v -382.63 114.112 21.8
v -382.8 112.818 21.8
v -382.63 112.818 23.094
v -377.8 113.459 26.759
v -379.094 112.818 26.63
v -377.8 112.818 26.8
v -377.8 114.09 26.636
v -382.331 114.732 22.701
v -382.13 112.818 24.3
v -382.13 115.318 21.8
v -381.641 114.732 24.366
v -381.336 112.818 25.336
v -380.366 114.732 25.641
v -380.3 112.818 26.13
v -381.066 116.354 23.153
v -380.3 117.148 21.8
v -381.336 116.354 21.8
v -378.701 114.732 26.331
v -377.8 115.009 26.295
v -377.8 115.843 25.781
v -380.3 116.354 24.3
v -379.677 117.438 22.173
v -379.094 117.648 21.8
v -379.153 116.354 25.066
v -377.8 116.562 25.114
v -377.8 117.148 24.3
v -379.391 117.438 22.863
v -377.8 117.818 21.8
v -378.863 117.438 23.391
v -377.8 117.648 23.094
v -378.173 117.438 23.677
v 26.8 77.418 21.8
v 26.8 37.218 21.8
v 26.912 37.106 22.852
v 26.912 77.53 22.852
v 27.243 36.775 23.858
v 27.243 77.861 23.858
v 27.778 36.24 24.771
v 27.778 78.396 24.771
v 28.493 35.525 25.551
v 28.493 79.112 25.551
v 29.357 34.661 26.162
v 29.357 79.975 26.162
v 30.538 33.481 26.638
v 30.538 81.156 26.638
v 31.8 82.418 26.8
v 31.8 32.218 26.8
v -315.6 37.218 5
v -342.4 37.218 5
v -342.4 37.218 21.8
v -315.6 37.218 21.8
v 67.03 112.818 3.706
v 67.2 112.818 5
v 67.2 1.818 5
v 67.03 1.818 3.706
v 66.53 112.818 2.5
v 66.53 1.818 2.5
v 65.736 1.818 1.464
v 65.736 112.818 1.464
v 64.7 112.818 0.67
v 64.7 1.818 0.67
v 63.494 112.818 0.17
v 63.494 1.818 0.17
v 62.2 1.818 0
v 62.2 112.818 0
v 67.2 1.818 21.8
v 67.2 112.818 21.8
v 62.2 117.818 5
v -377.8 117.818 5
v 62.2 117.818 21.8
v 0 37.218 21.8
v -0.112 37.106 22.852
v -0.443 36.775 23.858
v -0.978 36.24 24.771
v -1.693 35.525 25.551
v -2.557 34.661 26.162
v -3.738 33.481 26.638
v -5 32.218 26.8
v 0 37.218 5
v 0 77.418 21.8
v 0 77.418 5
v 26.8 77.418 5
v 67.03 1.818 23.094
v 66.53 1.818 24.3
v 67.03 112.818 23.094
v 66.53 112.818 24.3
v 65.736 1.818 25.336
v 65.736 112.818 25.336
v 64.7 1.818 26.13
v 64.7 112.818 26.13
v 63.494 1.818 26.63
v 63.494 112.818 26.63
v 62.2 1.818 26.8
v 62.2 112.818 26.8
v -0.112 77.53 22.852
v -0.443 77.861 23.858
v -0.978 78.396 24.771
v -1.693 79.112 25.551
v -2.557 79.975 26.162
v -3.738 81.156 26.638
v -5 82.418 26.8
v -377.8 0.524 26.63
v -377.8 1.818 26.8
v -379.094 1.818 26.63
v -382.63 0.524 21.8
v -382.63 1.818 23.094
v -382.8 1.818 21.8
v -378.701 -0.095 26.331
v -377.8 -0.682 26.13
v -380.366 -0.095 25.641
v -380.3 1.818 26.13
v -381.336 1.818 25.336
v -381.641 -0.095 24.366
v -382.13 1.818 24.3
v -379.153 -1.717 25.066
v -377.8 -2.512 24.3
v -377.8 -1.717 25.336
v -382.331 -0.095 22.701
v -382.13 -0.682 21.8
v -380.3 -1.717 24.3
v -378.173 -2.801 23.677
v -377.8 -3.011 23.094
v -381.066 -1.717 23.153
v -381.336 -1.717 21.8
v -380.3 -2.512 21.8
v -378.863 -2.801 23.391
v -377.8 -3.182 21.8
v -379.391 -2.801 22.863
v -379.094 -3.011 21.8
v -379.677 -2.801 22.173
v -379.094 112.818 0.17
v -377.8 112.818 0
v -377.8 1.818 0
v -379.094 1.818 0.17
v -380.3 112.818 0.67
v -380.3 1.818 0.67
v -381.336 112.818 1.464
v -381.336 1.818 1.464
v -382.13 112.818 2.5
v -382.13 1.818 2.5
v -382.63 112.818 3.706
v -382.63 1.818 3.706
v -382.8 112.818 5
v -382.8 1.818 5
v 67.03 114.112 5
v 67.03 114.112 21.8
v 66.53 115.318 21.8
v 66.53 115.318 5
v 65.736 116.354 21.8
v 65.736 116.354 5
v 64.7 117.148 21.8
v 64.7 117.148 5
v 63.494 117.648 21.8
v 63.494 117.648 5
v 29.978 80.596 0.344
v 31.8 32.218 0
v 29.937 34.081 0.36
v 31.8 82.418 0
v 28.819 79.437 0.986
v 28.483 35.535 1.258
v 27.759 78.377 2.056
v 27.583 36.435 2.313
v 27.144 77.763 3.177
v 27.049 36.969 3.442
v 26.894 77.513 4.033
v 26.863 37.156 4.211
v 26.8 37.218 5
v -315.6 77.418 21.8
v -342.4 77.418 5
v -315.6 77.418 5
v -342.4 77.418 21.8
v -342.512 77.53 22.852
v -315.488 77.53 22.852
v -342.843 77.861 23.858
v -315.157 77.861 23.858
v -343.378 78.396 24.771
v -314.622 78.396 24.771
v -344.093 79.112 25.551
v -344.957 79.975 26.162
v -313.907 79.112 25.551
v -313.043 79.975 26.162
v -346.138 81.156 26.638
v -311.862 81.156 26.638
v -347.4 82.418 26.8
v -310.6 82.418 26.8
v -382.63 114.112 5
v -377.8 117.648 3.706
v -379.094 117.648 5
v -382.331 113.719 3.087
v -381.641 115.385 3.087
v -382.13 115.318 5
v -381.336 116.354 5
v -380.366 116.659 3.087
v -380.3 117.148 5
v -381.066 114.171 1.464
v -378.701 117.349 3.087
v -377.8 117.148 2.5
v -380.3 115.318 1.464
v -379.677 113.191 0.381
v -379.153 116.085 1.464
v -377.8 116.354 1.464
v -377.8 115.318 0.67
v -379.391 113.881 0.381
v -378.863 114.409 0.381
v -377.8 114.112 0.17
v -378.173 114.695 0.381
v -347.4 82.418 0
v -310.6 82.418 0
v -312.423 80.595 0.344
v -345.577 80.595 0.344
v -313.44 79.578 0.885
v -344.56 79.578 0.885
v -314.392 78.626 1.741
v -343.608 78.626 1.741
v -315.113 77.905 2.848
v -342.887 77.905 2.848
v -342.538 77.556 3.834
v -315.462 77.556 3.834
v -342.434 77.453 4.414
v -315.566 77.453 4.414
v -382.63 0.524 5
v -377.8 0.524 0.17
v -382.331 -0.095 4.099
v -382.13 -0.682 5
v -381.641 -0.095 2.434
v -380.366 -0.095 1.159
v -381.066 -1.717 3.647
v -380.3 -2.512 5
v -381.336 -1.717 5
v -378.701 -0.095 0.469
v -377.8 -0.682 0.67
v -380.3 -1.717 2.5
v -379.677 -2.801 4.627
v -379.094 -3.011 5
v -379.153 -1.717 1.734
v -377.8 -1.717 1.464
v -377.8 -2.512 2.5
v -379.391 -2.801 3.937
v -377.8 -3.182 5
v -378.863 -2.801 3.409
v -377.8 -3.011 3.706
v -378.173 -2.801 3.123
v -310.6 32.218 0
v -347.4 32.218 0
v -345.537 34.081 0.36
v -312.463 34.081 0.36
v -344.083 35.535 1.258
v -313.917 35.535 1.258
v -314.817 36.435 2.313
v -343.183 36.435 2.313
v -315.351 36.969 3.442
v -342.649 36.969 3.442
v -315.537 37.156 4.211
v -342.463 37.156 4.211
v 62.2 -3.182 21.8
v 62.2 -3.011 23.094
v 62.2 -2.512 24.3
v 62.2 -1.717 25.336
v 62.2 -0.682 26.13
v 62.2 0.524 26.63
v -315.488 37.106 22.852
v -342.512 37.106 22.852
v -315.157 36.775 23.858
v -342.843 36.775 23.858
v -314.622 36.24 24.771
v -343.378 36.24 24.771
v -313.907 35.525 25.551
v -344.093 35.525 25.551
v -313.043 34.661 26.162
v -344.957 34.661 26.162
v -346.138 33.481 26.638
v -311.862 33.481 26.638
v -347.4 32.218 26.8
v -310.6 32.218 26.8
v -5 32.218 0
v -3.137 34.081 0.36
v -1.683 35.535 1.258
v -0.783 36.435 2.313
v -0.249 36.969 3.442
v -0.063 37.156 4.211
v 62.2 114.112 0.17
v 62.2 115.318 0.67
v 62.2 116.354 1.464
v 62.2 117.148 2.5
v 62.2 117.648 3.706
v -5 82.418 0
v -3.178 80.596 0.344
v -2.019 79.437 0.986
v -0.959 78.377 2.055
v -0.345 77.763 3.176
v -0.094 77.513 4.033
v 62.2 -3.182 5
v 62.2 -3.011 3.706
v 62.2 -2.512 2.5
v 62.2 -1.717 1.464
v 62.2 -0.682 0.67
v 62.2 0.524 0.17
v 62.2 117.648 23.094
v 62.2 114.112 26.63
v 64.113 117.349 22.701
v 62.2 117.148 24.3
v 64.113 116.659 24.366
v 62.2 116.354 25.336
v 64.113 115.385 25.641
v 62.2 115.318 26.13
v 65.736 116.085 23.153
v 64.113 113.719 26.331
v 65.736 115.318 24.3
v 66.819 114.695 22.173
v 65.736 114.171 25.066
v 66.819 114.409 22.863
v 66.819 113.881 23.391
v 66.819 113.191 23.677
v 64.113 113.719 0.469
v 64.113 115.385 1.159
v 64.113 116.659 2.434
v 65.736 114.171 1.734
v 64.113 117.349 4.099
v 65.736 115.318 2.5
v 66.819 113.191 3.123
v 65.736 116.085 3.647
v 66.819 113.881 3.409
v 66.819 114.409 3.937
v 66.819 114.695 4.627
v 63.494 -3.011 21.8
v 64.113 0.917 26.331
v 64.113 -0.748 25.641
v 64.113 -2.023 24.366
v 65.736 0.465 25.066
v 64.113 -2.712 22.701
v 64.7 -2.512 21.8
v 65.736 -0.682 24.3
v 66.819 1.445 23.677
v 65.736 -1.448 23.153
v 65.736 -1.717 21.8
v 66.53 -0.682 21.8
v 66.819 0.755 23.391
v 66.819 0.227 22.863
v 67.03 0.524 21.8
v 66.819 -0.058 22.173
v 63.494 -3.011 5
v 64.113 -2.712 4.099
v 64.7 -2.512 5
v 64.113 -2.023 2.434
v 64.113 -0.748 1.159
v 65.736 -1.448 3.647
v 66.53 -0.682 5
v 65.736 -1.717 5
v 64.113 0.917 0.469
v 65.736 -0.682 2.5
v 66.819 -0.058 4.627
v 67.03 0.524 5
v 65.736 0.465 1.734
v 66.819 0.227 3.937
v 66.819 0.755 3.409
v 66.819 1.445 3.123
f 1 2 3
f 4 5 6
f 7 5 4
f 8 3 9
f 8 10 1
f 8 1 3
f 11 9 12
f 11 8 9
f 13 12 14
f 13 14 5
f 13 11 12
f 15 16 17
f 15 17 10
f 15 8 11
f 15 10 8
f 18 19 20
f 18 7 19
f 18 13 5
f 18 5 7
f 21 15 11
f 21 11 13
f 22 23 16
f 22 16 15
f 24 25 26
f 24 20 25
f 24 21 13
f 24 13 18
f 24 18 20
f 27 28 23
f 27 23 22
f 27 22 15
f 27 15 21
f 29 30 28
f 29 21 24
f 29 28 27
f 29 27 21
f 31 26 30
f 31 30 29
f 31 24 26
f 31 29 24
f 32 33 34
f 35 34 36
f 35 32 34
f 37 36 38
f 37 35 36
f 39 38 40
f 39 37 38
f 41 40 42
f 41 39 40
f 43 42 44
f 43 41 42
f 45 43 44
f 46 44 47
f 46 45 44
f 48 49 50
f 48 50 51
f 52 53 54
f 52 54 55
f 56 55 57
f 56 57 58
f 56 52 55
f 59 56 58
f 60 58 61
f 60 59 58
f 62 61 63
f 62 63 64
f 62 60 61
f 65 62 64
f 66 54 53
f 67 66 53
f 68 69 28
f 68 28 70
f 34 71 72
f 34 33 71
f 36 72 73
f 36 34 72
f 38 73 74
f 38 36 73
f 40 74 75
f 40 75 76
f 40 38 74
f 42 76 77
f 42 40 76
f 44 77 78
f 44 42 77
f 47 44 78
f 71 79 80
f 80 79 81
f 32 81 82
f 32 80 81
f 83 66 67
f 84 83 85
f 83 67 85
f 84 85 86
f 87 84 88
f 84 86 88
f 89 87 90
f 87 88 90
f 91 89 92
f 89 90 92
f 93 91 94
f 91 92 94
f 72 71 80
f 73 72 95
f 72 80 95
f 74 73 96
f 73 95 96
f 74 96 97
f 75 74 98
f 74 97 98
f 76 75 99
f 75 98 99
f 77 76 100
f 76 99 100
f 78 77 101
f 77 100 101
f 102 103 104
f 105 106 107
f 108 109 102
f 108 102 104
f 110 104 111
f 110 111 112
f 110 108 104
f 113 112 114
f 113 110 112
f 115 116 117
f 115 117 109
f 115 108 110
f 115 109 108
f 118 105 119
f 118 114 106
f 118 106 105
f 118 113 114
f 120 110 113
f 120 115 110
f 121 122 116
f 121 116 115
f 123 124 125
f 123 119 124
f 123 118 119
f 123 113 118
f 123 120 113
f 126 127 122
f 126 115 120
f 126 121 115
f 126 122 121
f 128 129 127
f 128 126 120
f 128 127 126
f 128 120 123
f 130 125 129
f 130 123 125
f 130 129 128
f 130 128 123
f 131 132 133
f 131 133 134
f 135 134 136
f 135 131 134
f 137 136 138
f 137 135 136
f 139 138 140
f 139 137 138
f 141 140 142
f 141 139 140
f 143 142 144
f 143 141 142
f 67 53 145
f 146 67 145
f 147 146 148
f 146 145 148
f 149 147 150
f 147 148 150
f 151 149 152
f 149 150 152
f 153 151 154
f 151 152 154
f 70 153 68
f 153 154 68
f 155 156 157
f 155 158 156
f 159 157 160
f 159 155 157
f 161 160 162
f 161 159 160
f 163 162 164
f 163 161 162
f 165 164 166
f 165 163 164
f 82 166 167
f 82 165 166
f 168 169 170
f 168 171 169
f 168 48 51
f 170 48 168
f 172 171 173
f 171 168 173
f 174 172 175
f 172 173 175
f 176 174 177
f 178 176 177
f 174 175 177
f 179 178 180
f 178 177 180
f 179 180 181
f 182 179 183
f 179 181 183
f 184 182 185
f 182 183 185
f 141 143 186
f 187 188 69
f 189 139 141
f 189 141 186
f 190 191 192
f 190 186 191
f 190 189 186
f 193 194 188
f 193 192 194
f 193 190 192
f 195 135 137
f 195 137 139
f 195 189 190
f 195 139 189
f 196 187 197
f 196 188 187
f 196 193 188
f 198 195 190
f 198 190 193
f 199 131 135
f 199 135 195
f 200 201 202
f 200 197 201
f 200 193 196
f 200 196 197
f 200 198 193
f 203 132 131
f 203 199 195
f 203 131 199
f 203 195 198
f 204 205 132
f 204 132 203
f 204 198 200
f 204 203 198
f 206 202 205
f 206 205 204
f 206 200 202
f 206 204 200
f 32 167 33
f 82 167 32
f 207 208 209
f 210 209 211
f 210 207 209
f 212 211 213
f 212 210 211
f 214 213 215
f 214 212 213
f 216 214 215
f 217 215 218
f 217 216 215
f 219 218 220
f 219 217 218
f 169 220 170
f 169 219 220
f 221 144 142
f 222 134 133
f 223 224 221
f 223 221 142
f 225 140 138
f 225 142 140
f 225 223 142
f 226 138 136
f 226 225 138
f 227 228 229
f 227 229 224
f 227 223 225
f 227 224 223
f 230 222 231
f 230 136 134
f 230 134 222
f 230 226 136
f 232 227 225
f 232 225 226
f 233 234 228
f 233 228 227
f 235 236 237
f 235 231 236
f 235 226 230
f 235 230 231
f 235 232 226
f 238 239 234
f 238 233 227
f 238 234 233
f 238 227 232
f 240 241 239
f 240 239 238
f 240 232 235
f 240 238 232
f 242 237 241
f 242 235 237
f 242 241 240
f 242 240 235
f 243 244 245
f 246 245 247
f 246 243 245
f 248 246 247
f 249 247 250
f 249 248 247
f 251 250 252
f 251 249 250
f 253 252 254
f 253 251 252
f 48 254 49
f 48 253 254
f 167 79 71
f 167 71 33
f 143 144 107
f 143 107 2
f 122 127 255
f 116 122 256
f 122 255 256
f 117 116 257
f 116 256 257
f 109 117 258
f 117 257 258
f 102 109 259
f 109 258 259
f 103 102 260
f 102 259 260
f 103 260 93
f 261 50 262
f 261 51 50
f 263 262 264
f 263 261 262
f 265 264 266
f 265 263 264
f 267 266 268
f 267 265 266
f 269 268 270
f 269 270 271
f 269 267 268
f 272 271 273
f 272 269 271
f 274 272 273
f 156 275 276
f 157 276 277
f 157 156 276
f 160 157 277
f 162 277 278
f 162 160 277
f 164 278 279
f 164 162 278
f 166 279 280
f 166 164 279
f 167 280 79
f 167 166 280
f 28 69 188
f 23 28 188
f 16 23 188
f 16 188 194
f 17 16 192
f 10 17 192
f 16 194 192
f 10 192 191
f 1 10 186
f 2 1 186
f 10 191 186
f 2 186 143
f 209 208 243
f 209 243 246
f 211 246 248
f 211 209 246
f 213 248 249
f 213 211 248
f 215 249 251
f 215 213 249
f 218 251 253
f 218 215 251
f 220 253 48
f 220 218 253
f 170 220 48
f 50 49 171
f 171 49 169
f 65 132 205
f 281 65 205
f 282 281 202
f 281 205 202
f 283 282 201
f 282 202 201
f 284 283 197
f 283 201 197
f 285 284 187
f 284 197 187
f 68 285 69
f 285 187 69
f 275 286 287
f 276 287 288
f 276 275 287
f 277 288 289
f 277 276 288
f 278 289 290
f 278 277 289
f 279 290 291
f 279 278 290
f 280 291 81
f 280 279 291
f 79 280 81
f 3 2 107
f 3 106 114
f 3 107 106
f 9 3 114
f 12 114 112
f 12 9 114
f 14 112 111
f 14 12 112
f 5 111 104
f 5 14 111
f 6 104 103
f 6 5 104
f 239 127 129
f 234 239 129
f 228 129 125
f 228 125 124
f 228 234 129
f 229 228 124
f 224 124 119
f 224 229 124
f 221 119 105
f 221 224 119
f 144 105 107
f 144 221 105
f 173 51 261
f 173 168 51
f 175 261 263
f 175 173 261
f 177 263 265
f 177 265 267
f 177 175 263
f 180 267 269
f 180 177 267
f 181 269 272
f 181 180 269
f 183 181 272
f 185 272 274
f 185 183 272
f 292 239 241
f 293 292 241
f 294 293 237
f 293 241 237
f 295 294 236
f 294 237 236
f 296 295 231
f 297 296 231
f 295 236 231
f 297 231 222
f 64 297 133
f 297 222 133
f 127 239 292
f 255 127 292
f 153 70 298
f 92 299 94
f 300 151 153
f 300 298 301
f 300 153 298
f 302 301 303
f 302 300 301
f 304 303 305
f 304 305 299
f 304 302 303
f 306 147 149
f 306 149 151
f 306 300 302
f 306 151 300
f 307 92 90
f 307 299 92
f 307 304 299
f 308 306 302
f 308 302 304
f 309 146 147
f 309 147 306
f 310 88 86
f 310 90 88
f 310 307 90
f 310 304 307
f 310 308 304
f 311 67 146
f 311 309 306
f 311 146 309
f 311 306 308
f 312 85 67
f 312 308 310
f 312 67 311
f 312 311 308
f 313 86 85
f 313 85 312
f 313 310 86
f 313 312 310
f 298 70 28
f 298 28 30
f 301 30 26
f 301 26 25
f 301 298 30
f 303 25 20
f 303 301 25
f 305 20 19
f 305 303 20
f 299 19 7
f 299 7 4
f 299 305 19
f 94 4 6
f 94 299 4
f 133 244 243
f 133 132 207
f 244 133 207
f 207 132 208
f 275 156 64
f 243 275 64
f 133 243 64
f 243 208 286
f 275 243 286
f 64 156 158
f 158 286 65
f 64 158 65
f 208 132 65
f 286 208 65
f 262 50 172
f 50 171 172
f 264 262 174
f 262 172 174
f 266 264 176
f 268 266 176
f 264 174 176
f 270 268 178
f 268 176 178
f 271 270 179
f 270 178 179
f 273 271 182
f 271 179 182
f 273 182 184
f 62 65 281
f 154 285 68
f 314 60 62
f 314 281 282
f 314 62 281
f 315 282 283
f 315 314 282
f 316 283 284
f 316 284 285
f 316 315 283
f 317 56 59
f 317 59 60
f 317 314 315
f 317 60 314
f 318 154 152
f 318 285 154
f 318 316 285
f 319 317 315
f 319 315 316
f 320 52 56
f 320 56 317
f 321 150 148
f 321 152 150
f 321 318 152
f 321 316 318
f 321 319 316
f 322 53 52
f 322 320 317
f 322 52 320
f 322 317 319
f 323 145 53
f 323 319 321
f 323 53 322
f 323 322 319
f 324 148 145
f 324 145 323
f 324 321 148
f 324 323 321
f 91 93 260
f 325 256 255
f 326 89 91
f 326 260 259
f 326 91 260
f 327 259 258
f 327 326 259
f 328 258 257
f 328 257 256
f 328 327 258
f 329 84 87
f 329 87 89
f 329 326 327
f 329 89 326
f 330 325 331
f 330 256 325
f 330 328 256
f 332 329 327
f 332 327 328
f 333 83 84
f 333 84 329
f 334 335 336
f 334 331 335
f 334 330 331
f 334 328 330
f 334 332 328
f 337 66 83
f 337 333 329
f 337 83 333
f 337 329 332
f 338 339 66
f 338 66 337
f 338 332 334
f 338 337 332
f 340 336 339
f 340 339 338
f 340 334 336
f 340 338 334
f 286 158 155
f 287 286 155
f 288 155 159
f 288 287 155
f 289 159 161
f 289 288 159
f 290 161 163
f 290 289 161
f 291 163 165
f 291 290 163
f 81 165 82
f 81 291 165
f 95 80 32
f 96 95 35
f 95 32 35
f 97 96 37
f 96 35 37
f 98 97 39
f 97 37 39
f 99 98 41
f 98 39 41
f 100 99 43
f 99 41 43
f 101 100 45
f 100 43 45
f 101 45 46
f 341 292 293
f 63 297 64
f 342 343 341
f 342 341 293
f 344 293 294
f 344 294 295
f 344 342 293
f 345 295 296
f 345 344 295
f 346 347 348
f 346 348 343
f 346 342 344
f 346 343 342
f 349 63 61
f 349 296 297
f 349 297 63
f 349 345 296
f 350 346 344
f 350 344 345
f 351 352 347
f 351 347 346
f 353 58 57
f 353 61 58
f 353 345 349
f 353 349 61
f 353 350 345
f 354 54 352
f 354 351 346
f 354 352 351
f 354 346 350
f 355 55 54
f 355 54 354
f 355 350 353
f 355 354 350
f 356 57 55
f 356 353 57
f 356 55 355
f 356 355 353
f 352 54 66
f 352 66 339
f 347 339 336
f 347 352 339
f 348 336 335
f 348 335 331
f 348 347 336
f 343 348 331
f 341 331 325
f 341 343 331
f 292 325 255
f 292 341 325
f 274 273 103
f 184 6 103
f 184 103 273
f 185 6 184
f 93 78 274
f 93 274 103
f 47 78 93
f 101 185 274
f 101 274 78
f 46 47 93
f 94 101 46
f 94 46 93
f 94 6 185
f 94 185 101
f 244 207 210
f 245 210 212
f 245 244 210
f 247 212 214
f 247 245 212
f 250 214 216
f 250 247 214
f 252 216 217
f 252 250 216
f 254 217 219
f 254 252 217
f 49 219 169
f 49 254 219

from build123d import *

# Parameters (mm, degrees)
F0_W          = 450
F0_H          = 121
F0_W_2        = 26.8
F0_H_2        = 40.2
F1_DEPTH      = 26.8
F2_R          = 5
F3_T1_DEPTH   = 440
F3_T3_DEPTH   = 111
F3_T5_DEPTH   = 40.2
F3_T7_DEPTH   = 26.8
F3_T9_DEPTH   = 26.8
F3_T11_DEPTH  = 16.8
F3_S15_W      = 5
F3_S15_H      = 5
F3_T16_DEPTH  = 5
F3_S21_W      = 5
F3_S21_H      = 5
F3_T22_DEPTH  = 5
F3_S27_W      = 5
F3_S27_H      = 5
F3_T28_DEPTH  = 5
F3_S33_W      = 5
F3_S33_H      = 5
F3_T34_DEPTH  = 5
F3_S39_W      = 5
F3_S39_H      = 5
F3_T40_DEPTH  = 5
F3_S45_W      = 5
F3_S45_H      = 5
F3_T46_DEPTH  = 5
F3_S51_W      = 5
F3_S51_H      = 5
F3_T52_DEPTH  = 5
F3_S57_W      = 5
F3_S57_H      = 5
F3_T58_DEPTH  = 5
F3_T65_DEPTH  = 39.3
F3_T69_DEPTH  = 52.7
F3_T76_DEPTH  = 39.3
F3_T80_DEPTH  = 52.7
F3_T87_DEPTH  = 39.3
F3_T91_DEPTH  = 52.7
F3_T98_DEPTH  = 52.7
F3_T102_DEPTH = 39.3
F3_T109_DEPTH = 52.7
F3_T113_DEPTH = 39.3
F3_T120_DEPTH = 52.7
F3_T124_DEPTH = 39.3
F3_T131_DEPTH = 52.7
F3_T135_DEPTH = 39.3
F3_T142_DEPTH = 39.3
F3_T146_DEPTH = 52.7


# Not quite as in the source:
# - a fillet or chamfer that OpenCascade refuses, or shapes differently, is made with other operations: its cross-section is extruded or revolved along the edge and cut away or added


with BuildPart() as f1:
    # F0 (on Top) → F1 (new body)
    with BuildSketch(Plane.XY):
        with Locations((-157.8, 57.318181593)):
            Rectangle(F0_W, F0_H)
        with Locations((-329, 57.318181593)):
            Rectangle(F0_W_2, F0_H_2, mode=Mode.SUBTRACT)
        with Locations((13.4, 57.318181593)):
            Rectangle(F0_W_2, F0_H_2, mode=Mode.SUBTRACT)
    extrude(amount=F1_DEPTH)

    # F2
    f2_edges = [f1.edges().sort_by_distance(p)[0] for p in [
        (67.2, 57.318182, 26.8),
        (-157.8, 117.818182, 26.8),
        (-382.8, 57.318182, 26.8),
        (-157.8, -3.181818, 26.8),
        (-342.4, 57.318182, 26.8),
        (-329, 77.418182, 26.8),
        (-315.6, 57.318182, 26.8),
        (-329, 37.218182, 26.8),
        (13.4, 77.418182, 26.8),
        (26.8, 57.318182, 26.8),
        (13.4, 37.218182, 26.8),
        (0, 57.318182, 26.8),
    ]]
    fillet(f2_edges, radius=F2_R)

    # F3: fillet of radius 5 on 16 edges, made by hand

    # F3_s2 → F3_t1 (cut)
    with BuildSketch(Plane.YZ.offset(-377.8)):
        with BuildLine():
            ThreePointArc((-3.181818407, 5), (-1.717352313, 1.4644660941), (1.818181593, 0))
            Line((1.818181593, 0), (-3.181818407, 0))
            Line((-3.181818407, 0), (-3.181818407, 5))
        make_face()
        with BuildLine():
            ThreePointArc((112.818181593, 0), (116.3537154989, 1.4644660941), (117.818181593, 5))
            Line((117.818181593, 5), (117.818181593, 0))
            Line((117.818181593, 0), (112.818181593, 0))
        make_face()
    extrude(amount=F3_T1_DEPTH, mode=Mode.SUBTRACT)

    # F3_s4 → F3_t3 (cut)
    with BuildSketch(Plane.XZ.offset(-112.818181593)):
        with BuildLine():
            ThreePointArc((-377.8, 0), (-381.3355339059, 1.4644660941), (-382.8, 5))
            Line((-382.8, 5), (-382.8, 0))
            Line((-382.8, 0), (-377.8, 0))
        make_face()
        with BuildLine():
            ThreePointArc((67.2, 5), (65.7355339059, 1.4644660941), (62.2, 0))
            Line((62.2, 0), (67.2, 0))
            Line((67.2, 0), (67.2, 5))
        make_face()
    extrude(amount=F3_T3_DEPTH, mode=Mode.SUBTRACT)

    # F3_s6 → F3_t5 (cut)
    with BuildSketch(Plane.XZ.offset(-77.418181593)):
        with BuildLine():
            ThreePointArc((-5, 0), (-1.4644660941, 1.4644660941), (0, 5))
            Line((0, 5), (0, 0))
            Line((0, 0), (-5, 0))
        make_face()
        with BuildLine():
            ThreePointArc((31.8, 0), (28.2644660941, 1.4644660941), (26.8, 5))
            Line((26.8, 5), (26.8, 0))
            Line((26.8, 0), (31.8, 0))
        make_face()
        with BuildLine():
            ThreePointArc((-347.4, 0), (-343.8644660941, 1.4644660941), (-342.4, 5))
            Line((-342.4, 5), (-342.4, 0))
            Line((-342.4, 0), (-347.4, 0))
        make_face()
        with BuildLine():
            ThreePointArc((-310.6, 0), (-314.1355339059, 1.4644660941), (-315.6, 5))
            Line((-315.6, 5), (-315.6, 0))
            Line((-315.6, 0), (-310.6, 0))
        make_face()
    extrude(amount=F3_T5_DEPTH, mode=Mode.SUBTRACT)

    # F3_s8 → F3_t7 (cut)
    with BuildSketch(Plane.YZ):
        with BuildLine():
            ThreePointArc((82.418181593, 0), (78.882647687, 1.4644660941), (77.418181593, 5))
            Line((77.418181593, 5), (77.418181593, 0))
            Line((77.418181593, 0), (82.418181593, 0))
        make_face()
        with BuildLine():
            ThreePointArc((32.218181593, 0), (35.7537154989, 1.4644660941), (37.218181593, 5))
            Line((37.218181593, 5), (37.218181593, 0))
            Line((37.218181593, 0), (32.218181593, 0))
        make_face()
    extrude(amount=F3_T7_DEPTH, mode=Mode.SUBTRACT)

    # F3_s10 → F3_t9 (cut)
    with BuildSketch(Plane.YZ.offset(-342.4)):
        with BuildLine():
            ThreePointArc((32.218181593, 0), (35.7537154989, 1.4644660941), (37.218181593, 5))
            Line((37.218181593, 5), (37.218181593, 0))
            Line((37.218181593, 0), (32.218181593, 0))
        make_face()
        with BuildLine():
            ThreePointArc((82.418181593, 0), (78.882647687, 1.4644660941), (77.418181593, 5))
            Line((77.418181593, 5), (77.418181593, 0))
            Line((77.418181593, 0), (82.418181593, 0))
        make_face()
    extrude(amount=F3_T9_DEPTH, mode=Mode.SUBTRACT)

    # F3_s12 → F3_t11 (cut)
    with BuildSketch(Plane.XY.offset(5)):
        with BuildLine():
            ThreePointArc((-377.8, -3.181818407), (-381.3355339059, -1.717352313), (-382.8, 1.818181593))
            Line((-382.8, 1.818181593), (-382.8, -3.181818407))
            Line((-382.8, -3.181818407), (-377.8, -3.181818407))
        make_face()
        with BuildLine():
            ThreePointArc((67.2, 1.818181593), (65.7355339059, -1.717352313), (62.2, -3.181818407))
            Line((62.2, -3.181818407), (67.2, -3.181818407))
            Line((67.2, -3.181818407), (67.2, 1.818181593))
        make_face()
        with BuildLine():
            ThreePointArc((-377.8, 117.818181593), (-381.3355339059, 116.3537154989), (-382.8, 112.818181593))
            Line((-382.8, 112.818181593), (-382.8, 117.818181593))
            Line((-382.8, 117.818181593), (-377.8, 117.818181593))
        make_face()
        with BuildLine():
            ThreePointArc((67.2, 112.818181593), (65.7355339059, 116.3537154989), (62.2, 117.818181593))
            Line((62.2, 117.818181593), (67.2, 117.818181593))
            Line((67.2, 117.818181593), (67.2, 112.818181593))
        make_face()
    extrude(amount=F3_T11_DEPTH, mode=Mode.SUBTRACT)


with BuildPart() as f3_tool14:
    # F3_s15 → F3_t16 (new body)
    with BuildSketch(Plane.YZ.offset(62.2)):
        with Locations((115.318181593, 24.3)):
            Rectangle(F3_S15_W, F3_S15_H)
    extrude(amount=F3_T16_DEPTH)

    # F3_s17 → F3_t18 (revolve, cut)
    with BuildSketch(Plane(origin=(62.2, 112.818181593, 21.8), x_dir=(0, -0.7071067812, -0.7071067812), z_dir=(0, -0.7071067812, 0.7071067812))):
        with BuildLine():
            ThreePointArc((0, -5), (5, 0), (0, 5))
            Line((0, 5), (0, -5))
        make_face()
    revolve(axis=Axis((62.2, 112.818181593, 21.8), (1, 0, 0)), mode=Mode.SUBTRACT)


with BuildPart() as f1_1:
    add(f1.part)

    # F3_t13: cut F3_tool14
    add(f3_tool14.part, mode=Mode.SUBTRACT)


with BuildPart() as f3_tool20:
    # F3_s21 → F3_t22 (new body)
    with BuildSketch(Plane.XZ.offset(-112.818181593)):
        with Locations((-380.3, 24.3)):
            Rectangle(F3_S21_W, F3_S21_H)
    extrude(amount=-F3_T22_DEPTH)

    # F3_s23 → F3_t24 (revolve, cut)
    with BuildSketch(Plane(origin=(-377.8, 112.818181593, 21.8), x_dir=(0.7071067812, 0, -0.7071067812), z_dir=(0.7071067812, 0, 0.7071067812))):
        with BuildLine():
            ThreePointArc((0, -5), (5, 0), (0, 5))
            Line((0, 5), (0, -5))
        make_face()
    revolve(axis=Axis((-377.8, 112.818181593, 21.8), (0, 1, 0)), mode=Mode.SUBTRACT)


with BuildPart() as f1_2:
    add(f1_1.part)

    # F3_t19: cut F3_tool20
    add(f3_tool20.part, mode=Mode.SUBTRACT)


with BuildPart() as f3_tool26:
    # F3_s27 → F3_t28 (new body)
    with BuildSketch(Plane.YZ.offset(62.2)):
        with Locations((-0.681818407, 24.3)):
            Rectangle(F3_S27_W, F3_S27_H)
    extrude(amount=F3_T28_DEPTH)

    # F3_s29 → F3_t30 (revolve, cut)
    with BuildSketch(Plane(origin=(62.2, 1.818181593, 21.8), x_dir=(0, 0.7071067812, -0.7071067812), z_dir=(0, -0.7071067812, -0.7071067812))):
        with BuildLine():
            ThreePointArc((0, -5), (5, 0), (0, 5))
            Line((0, 5), (0, -5))
        make_face()
    revolve(axis=Axis((62.2, 1.818181593, 21.8), (1, 0, 0)), mode=Mode.SUBTRACT)


with BuildPart() as f1_3:
    add(f1_2.part)

    # F3_t25: cut F3_tool26
    add(f3_tool26.part, mode=Mode.SUBTRACT)


with BuildPart() as f3_tool32:
    # F3_s33 → F3_t34 (new body)
    with BuildSketch(Plane.XZ.offset(-1.818181593)):
        with Locations((-380.3, 24.3)):
            Rectangle(F3_S33_W, F3_S33_H)
    extrude(amount=F3_T34_DEPTH)

    # F3_s35 → F3_t36 (revolve, cut)
    with BuildSketch(Plane(origin=(-377.8, 1.818181593, 21.8), x_dir=(0.7071067812, 0, -0.7071067812), z_dir=(-0.7071067812, 0, -0.7071067812))):
        with BuildLine():
            ThreePointArc((0, -5), (5, 0), (0, 5))
            Line((0, 5), (0, -5))
        make_face()
    revolve(axis=Axis((-377.8, 1.818181593, 21.8), (0, -1, 0)), mode=Mode.SUBTRACT)


with BuildPart() as f1_4:
    add(f1_3.part)

    # F3_t31: cut F3_tool32
    add(f3_tool32.part, mode=Mode.SUBTRACT)


with BuildPart() as f3_tool38:
    # F3_s39 → F3_t40 (new body)
    with BuildSketch(Plane.XZ.offset(-1.818181593)):
        with Locations((-380.3, 2.5)):
            Rectangle(F3_S39_W, F3_S39_H)
    extrude(amount=F3_T40_DEPTH)

    # F3_s41 → F3_t42 (revolve, cut)
    with BuildSketch(Plane(origin=(-377.8, 1.818181593, 5), x_dir=(0.7071067812, 0, 0.7071067812), z_dir=(0.7071067812, 0, -0.7071067812))):
        with BuildLine():
            ThreePointArc((0, -5), (5, 0), (0, 5))
            Line((0, 5), (0, -5))
        make_face()
    revolve(axis=Axis((-377.8, 1.818181593, 5), (0, -1, 0)), mode=Mode.SUBTRACT)


with BuildPart() as f1_5:
    add(f1_4.part)

    # F3_t37: cut F3_tool38
    add(f3_tool38.part, mode=Mode.SUBTRACT)


with BuildPart() as f3_tool44:
    # F3_s45 → F3_t46 (new body)
    with BuildSketch(Plane.YZ.offset(62.2)):
        with Locations((-0.681818407, 2.5)):
            Rectangle(F3_S45_W, F3_S45_H)
    extrude(amount=F3_T46_DEPTH)

    # F3_s47 → F3_t48 (revolve, cut)
    with BuildSketch(Plane(origin=(62.2, 1.818181593, 5), x_dir=(0, 0.7071067812, 0.7071067812), z_dir=(0, 0.7071067812, -0.7071067812))):
        with BuildLine():
            ThreePointArc((0, -5), (5, 0), (0, 5))
            Line((0, 5), (0, -5))
        make_face()
    revolve(axis=Axis((62.2, 1.818181593, 5), (1, 0, 0)), mode=Mode.SUBTRACT)


with BuildPart() as f1_6:
    add(f1_5.part)

    # F3_t43: cut F3_tool44
    add(f3_tool44.part, mode=Mode.SUBTRACT)


with BuildPart() as f3_tool50:
    # F3_s51 → F3_t52 (new body)
    with BuildSketch(Plane.XY.offset(5)):
        with Locations((-380.3, 115.318181593)):
            Rectangle(F3_S51_W, F3_S51_H)
    extrude(amount=-F3_T52_DEPTH)

    # F3_s53 → F3_t54 (revolve, cut)
    with BuildSketch(Plane(origin=(-377.8, 112.818181593, 5), x_dir=(0.7071067812, -0.7071067812, 0), z_dir=(0.7071067812, 0.7071067812, 0))):
        with BuildLine():
            ThreePointArc((0, -5), (5, 0), (0, 5))
            Line((0, 5), (0, -5))
        make_face()
    revolve(axis=Axis((-377.8, 112.818181593, 5), (0, 0, -1)), mode=Mode.SUBTRACT)


with BuildPart() as f1_7:
    add(f1_6.part)

    # F3_t49: cut F3_tool50
    add(f3_tool50.part, mode=Mode.SUBTRACT)


with BuildPart() as f3_tool56:
    # F3_s57 → F3_t58 (new body)
    with BuildSketch(Plane.YZ.offset(62.2)):
        with Locations((115.318181593, 2.5)):
            Rectangle(F3_S57_W, F3_S57_H)
    extrude(amount=F3_T58_DEPTH)

    # F3_s59 → F3_t60 (revolve, cut)
    with BuildSketch(Plane(origin=(62.2, 112.818181593, 5), x_dir=(0, -0.7071067812, 0.7071067812), z_dir=(0, 0.7071067812, 0.7071067812))):
        with BuildLine():
            ThreePointArc((0, -5), (5, 0), (0, 5))
            Line((0, 5), (0, -5))
        make_face()
    revolve(axis=Axis((62.2, 112.818181593, 5), (1, 0, 0)), mode=Mode.SUBTRACT)


with BuildPart() as f1_8:
    add(f1_7.part)

    # F3_t55: cut F3_tool56
    add(f3_tool56.part, mode=Mode.SUBTRACT)


with BuildPart() as f3_tool63:
    # F3_s64 → F3_t65 (new body)
    with BuildSketch(Plane.YZ.offset(26.8)):
        with BuildLine():
            ThreePointArc((32.218181593, 0), (35.7537154989, 1.4644660941), (37.218181593, 5))
            Line((37.218181593, 5), (37.218181593, 0))
            Line((37.218181593, 0), (32.218181593, 0))
        make_face()
    extrude(amount=-F3_T65_DEPTH)

    split(bisect_by=Plane.YZ, keep=Keep.BOTTOM)


with BuildPart() as f3_tool67:
    # F3_s68 → F3_t69 (new body)
    with BuildSketch(Plane.XZ.offset(-24.718181593)):
        with BuildLine():
            ThreePointArc((-5, 0), (-1.4644660941, 1.4644660941), (0, 5))
            Line((0, 5), (0, 0))
            Line((0, 0), (-5, 0))
        make_face()
    extrude(amount=-F3_T69_DEPTH)

    split(bisect_by=Plane.XZ.offset(-37.218181593), keep=Keep.TOP)


with BuildPart() as f3_tool63_1:
    add(f3_tool63.part)

    # F3_t71: intersect F3_tool67
    add(f3_tool67.part, mode=Mode.INTERSECT)


with BuildPart() as f1_9:
    add(f1_8.part)

    # F3_t61: cut F3_tool63
    add(f3_tool63_1.part, mode=Mode.SUBTRACT)


with BuildPart() as f3_tool74:
    # F3_s75 → F3_t76 (new body)
    with BuildSketch(Plane.YZ.offset(-12.5)):
        with BuildLine():
            ThreePointArc((82.418181593, 0), (78.882647687, 1.4644660941), (77.418181593, 5))
            Line((77.418181593, 5), (77.418181593, 0))
            Line((77.418181593, 0), (82.418181593, 0))
        make_face()
    extrude(amount=F3_T76_DEPTH)

    split(bisect_by=Plane.YZ, keep=Keep.BOTTOM)


with BuildPart() as f3_tool78:
    # F3_s79 → F3_t80 (new body)
    with BuildSketch(Plane.XZ.offset(-37.218181593)):
        with BuildLine():
            ThreePointArc((-5, 0), (-1.4644660941, 1.4644660941), (0, 5))
            Line((0, 5), (0, 0))
            Line((0, 0), (-5, 0))
        make_face()
    extrude(amount=-F3_T80_DEPTH)

    split(bisect_by=Plane.XZ.offset(-77.418181593), keep=Keep.BOTTOM)


with BuildPart() as f3_tool74_1:
    add(f3_tool74.part)

    # F3_t82: intersect F3_tool78
    add(f3_tool78.part, mode=Mode.INTERSECT)


with BuildPart() as f1_10:
    add(f1_9.part)

    # F3_t72: cut F3_tool74
    add(f3_tool74_1.part, mode=Mode.SUBTRACT)


with BuildPart() as f3_tool85:
    # F3_s86 → F3_t87 (new body)
    with BuildSketch(Plane.YZ):
        with BuildLine():
            ThreePointArc((82.418181593, 0), (78.882647687, 1.4644660941), (77.418181593, 5))
            Line((77.418181593, 5), (77.418181593, 0))
            Line((77.418181593, 0), (82.418181593, 0))
        make_face()
    extrude(amount=F3_T87_DEPTH)

    split(bisect_by=Plane.YZ.offset(26.8), keep=Keep.TOP)


with BuildPart() as f3_tool89:
    # F3_s90 → F3_t91 (new body)
    with BuildSketch(Plane.XZ.offset(-89.918181593)):
        with BuildLine():
            ThreePointArc((31.8, 0), (28.2644660941, 1.4644660941), (26.8, 5))
            Line((26.8, 5), (26.8, 0))
            Line((26.8, 0), (31.8, 0))
        make_face()
    extrude(amount=F3_T91_DEPTH)

    split(bisect_by=Plane.XZ.offset(-77.418181593), keep=Keep.BOTTOM)


with BuildPart() as f3_tool85_1:
    add(f3_tool85.part)

    # F3_t93: intersect F3_tool89
    add(f3_tool89.part, mode=Mode.INTERSECT)


with BuildPart() as f1_11:
    add(f1_10.part)

    # F3_t83: cut F3_tool85
    add(f3_tool85_1.part, mode=Mode.SUBTRACT)


with BuildPart() as f3_tool96:
    # F3_s97 → F3_t98 (new body)
    with BuildSketch(Plane.XZ.offset(-77.418181593)):
        with BuildLine():
            ThreePointArc((31.8, 0), (28.2644660941, 1.4644660941), (26.8, 5))
            Line((26.8, 5), (26.8, 0))
            Line((26.8, 0), (31.8, 0))
        make_face()
    extrude(amount=F3_T98_DEPTH)

    split(bisect_by=Plane.XZ.offset(-37.218181593), keep=Keep.TOP)


with BuildPart() as f3_tool100:
    # F3_s101 → F3_t102 (new body)
    with BuildSketch(Plane.YZ.offset(39.3)):
        with BuildLine():
            ThreePointArc((32.218181593, 0), (35.7537154989, 1.4644660941), (37.218181593, 5))
            Line((37.218181593, 5), (37.218181593, 0))
            Line((37.218181593, 0), (32.218181593, 0))
        make_face()
    extrude(amount=-F3_T102_DEPTH)

    split(bisect_by=Plane.YZ.offset(26.8), keep=Keep.TOP)


with BuildPart() as f3_tool96_1:
    add(f3_tool96.part)

    # F3_t104: intersect F3_tool100
    add(f3_tool100.part, mode=Mode.INTERSECT)


with BuildPart() as f1_12:
    add(f1_11.part)

    # F3_t94: cut F3_tool96
    add(f3_tool96_1.part, mode=Mode.SUBTRACT)


with BuildPart() as f3_tool107:
    # F3_s108 → F3_t109 (new body)
    with BuildSketch(Plane.XZ.offset(-77.418181593)):
        with BuildLine():
            ThreePointArc((-310.6, 0), (-314.1355339059, 1.4644660941), (-315.6, 5))
            Line((-315.6, 5), (-315.6, 0))
            Line((-315.6, 0), (-310.6, 0))
        make_face()
    extrude(amount=F3_T109_DEPTH)

    split(bisect_by=Plane.XZ.offset(-37.218181593), keep=Keep.TOP)


with BuildPart() as f3_tool111:
    # F3_s112 → F3_t113 (new body)
    with BuildSketch(Plane.YZ.offset(-303.1)):
        with BuildLine():
            ThreePointArc((32.218181593, 0), (35.7537154989, 1.4644660941), (37.218181593, 5))
            Line((37.218181593, 5), (37.218181593, 0))
            Line((37.218181593, 0), (32.218181593, 0))
        make_face()
    extrude(amount=-F3_T113_DEPTH)

    split(bisect_by=Plane.YZ.offset(-315.6), keep=Keep.TOP)


with BuildPart() as f3_tool107_1:
    add(f3_tool107.part)

    # F3_t115: intersect F3_tool111
    add(f3_tool111.part, mode=Mode.INTERSECT)


with BuildPart() as f1_13:
    add(f1_12.part)

    # F3_t105: cut F3_tool107
    add(f3_tool107_1.part, mode=Mode.SUBTRACT)


with BuildPart() as f3_tool118:
    # F3_s119 → F3_t120 (new body)
    with BuildSketch(Plane.XZ.offset(-24.718181593)):
        with BuildLine():
            ThreePointArc((-347.4, 0), (-343.8644660941, 1.4644660941), (-342.4, 5))
            Line((-342.4, 5), (-342.4, 0))
            Line((-342.4, 0), (-347.4, 0))
        make_face()
    extrude(amount=-F3_T120_DEPTH)

    split(bisect_by=Plane.XZ.offset(-37.218181593), keep=Keep.TOP)


with BuildPart() as f3_tool122:
    # F3_s123 → F3_t124 (new body)
    with BuildSketch(Plane.YZ.offset(-315.6)):
        with BuildLine():
            ThreePointArc((32.218181593, 0), (35.7537154989, 1.4644660941), (37.218181593, 5))
            Line((37.218181593, 5), (37.218181593, 0))
            Line((37.218181593, 0), (32.218181593, 0))
        make_face()
    extrude(amount=-F3_T124_DEPTH)

    split(bisect_by=Plane.YZ.offset(-342.4), keep=Keep.BOTTOM)


with BuildPart() as f3_tool118_1:
    add(f3_tool118.part)

    # F3_t126: intersect F3_tool122
    add(f3_tool122.part, mode=Mode.INTERSECT)


with BuildPart() as f1_14:
    add(f1_13.part)

    # F3_t116: cut F3_tool118
    add(f3_tool118_1.part, mode=Mode.SUBTRACT)


with BuildPart() as f3_tool129:
    # F3_s130 → F3_t131 (new body)
    with BuildSketch(Plane.XZ.offset(-37.218181593)):
        with BuildLine():
            ThreePointArc((-347.4, 0), (-343.8644660941, 1.4644660941), (-342.4, 5))
            Line((-342.4, 5), (-342.4, 0))
            Line((-342.4, 0), (-347.4, 0))
        make_face()
    extrude(amount=-F3_T131_DEPTH)

    split(bisect_by=Plane.XZ.offset(-77.418181593), keep=Keep.BOTTOM)


with BuildPart() as f3_tool133:
    # F3_s134 → F3_t135 (new body)
    with BuildSketch(Plane.YZ.offset(-354.9)):
        with BuildLine():
            ThreePointArc((82.418181593, 0), (78.882647687, 1.4644660941), (77.418181593, 5))
            Line((77.418181593, 5), (77.418181593, 0))
            Line((77.418181593, 0), (82.418181593, 0))
        make_face()
    extrude(amount=F3_T135_DEPTH)

    split(bisect_by=Plane.YZ.offset(-342.4), keep=Keep.BOTTOM)


with BuildPart() as f3_tool129_1:
    add(f3_tool129.part)

    # F3_t137: intersect F3_tool133
    add(f3_tool133.part, mode=Mode.INTERSECT)


with BuildPart() as f1_15:
    add(f1_14.part)

    # F3_t127: cut F3_tool129
    add(f3_tool129_1.part, mode=Mode.SUBTRACT)


with BuildPart() as f3_tool140:
    # F3_s141 → F3_t142 (new body)
    with BuildSketch(Plane.YZ.offset(-342.4)):
        with BuildLine():
            ThreePointArc((82.418181593, 0), (78.882647687, 1.4644660941), (77.418181593, 5))
            Line((77.418181593, 5), (77.418181593, 0))
            Line((77.418181593, 0), (82.418181593, 0))
        make_face()
    extrude(amount=F3_T142_DEPTH)

    split(bisect_by=Plane.YZ.offset(-315.6), keep=Keep.TOP)


with BuildPart() as f3_tool144:
    # F3_s145 → F3_t146 (new body)
    with BuildSketch(Plane.XZ.offset(-89.918181593)):
        with BuildLine():
            ThreePointArc((-310.6, 0), (-314.1355339059, 1.4644660941), (-315.6, 5))
            Line((-315.6, 5), (-315.6, 0))
            Line((-315.6, 0), (-310.6, 0))
        make_face()
    extrude(amount=F3_T146_DEPTH)

    split(bisect_by=Plane.XZ.offset(-77.418181593), keep=Keep.BOTTOM)


with BuildPart() as f3_tool140_1:
    add(f3_tool140.part)

    # F3_t148: intersect F3_tool144
    add(f3_tool144.part, mode=Mode.INTERSECT)


with BuildPart() as f1_16:
    add(f1_15.part)

    # F3_t138: cut F3_tool140
    add(f3_tool140_1.part, mode=Mode.SUBTRACT)


solid = f1_16.part
